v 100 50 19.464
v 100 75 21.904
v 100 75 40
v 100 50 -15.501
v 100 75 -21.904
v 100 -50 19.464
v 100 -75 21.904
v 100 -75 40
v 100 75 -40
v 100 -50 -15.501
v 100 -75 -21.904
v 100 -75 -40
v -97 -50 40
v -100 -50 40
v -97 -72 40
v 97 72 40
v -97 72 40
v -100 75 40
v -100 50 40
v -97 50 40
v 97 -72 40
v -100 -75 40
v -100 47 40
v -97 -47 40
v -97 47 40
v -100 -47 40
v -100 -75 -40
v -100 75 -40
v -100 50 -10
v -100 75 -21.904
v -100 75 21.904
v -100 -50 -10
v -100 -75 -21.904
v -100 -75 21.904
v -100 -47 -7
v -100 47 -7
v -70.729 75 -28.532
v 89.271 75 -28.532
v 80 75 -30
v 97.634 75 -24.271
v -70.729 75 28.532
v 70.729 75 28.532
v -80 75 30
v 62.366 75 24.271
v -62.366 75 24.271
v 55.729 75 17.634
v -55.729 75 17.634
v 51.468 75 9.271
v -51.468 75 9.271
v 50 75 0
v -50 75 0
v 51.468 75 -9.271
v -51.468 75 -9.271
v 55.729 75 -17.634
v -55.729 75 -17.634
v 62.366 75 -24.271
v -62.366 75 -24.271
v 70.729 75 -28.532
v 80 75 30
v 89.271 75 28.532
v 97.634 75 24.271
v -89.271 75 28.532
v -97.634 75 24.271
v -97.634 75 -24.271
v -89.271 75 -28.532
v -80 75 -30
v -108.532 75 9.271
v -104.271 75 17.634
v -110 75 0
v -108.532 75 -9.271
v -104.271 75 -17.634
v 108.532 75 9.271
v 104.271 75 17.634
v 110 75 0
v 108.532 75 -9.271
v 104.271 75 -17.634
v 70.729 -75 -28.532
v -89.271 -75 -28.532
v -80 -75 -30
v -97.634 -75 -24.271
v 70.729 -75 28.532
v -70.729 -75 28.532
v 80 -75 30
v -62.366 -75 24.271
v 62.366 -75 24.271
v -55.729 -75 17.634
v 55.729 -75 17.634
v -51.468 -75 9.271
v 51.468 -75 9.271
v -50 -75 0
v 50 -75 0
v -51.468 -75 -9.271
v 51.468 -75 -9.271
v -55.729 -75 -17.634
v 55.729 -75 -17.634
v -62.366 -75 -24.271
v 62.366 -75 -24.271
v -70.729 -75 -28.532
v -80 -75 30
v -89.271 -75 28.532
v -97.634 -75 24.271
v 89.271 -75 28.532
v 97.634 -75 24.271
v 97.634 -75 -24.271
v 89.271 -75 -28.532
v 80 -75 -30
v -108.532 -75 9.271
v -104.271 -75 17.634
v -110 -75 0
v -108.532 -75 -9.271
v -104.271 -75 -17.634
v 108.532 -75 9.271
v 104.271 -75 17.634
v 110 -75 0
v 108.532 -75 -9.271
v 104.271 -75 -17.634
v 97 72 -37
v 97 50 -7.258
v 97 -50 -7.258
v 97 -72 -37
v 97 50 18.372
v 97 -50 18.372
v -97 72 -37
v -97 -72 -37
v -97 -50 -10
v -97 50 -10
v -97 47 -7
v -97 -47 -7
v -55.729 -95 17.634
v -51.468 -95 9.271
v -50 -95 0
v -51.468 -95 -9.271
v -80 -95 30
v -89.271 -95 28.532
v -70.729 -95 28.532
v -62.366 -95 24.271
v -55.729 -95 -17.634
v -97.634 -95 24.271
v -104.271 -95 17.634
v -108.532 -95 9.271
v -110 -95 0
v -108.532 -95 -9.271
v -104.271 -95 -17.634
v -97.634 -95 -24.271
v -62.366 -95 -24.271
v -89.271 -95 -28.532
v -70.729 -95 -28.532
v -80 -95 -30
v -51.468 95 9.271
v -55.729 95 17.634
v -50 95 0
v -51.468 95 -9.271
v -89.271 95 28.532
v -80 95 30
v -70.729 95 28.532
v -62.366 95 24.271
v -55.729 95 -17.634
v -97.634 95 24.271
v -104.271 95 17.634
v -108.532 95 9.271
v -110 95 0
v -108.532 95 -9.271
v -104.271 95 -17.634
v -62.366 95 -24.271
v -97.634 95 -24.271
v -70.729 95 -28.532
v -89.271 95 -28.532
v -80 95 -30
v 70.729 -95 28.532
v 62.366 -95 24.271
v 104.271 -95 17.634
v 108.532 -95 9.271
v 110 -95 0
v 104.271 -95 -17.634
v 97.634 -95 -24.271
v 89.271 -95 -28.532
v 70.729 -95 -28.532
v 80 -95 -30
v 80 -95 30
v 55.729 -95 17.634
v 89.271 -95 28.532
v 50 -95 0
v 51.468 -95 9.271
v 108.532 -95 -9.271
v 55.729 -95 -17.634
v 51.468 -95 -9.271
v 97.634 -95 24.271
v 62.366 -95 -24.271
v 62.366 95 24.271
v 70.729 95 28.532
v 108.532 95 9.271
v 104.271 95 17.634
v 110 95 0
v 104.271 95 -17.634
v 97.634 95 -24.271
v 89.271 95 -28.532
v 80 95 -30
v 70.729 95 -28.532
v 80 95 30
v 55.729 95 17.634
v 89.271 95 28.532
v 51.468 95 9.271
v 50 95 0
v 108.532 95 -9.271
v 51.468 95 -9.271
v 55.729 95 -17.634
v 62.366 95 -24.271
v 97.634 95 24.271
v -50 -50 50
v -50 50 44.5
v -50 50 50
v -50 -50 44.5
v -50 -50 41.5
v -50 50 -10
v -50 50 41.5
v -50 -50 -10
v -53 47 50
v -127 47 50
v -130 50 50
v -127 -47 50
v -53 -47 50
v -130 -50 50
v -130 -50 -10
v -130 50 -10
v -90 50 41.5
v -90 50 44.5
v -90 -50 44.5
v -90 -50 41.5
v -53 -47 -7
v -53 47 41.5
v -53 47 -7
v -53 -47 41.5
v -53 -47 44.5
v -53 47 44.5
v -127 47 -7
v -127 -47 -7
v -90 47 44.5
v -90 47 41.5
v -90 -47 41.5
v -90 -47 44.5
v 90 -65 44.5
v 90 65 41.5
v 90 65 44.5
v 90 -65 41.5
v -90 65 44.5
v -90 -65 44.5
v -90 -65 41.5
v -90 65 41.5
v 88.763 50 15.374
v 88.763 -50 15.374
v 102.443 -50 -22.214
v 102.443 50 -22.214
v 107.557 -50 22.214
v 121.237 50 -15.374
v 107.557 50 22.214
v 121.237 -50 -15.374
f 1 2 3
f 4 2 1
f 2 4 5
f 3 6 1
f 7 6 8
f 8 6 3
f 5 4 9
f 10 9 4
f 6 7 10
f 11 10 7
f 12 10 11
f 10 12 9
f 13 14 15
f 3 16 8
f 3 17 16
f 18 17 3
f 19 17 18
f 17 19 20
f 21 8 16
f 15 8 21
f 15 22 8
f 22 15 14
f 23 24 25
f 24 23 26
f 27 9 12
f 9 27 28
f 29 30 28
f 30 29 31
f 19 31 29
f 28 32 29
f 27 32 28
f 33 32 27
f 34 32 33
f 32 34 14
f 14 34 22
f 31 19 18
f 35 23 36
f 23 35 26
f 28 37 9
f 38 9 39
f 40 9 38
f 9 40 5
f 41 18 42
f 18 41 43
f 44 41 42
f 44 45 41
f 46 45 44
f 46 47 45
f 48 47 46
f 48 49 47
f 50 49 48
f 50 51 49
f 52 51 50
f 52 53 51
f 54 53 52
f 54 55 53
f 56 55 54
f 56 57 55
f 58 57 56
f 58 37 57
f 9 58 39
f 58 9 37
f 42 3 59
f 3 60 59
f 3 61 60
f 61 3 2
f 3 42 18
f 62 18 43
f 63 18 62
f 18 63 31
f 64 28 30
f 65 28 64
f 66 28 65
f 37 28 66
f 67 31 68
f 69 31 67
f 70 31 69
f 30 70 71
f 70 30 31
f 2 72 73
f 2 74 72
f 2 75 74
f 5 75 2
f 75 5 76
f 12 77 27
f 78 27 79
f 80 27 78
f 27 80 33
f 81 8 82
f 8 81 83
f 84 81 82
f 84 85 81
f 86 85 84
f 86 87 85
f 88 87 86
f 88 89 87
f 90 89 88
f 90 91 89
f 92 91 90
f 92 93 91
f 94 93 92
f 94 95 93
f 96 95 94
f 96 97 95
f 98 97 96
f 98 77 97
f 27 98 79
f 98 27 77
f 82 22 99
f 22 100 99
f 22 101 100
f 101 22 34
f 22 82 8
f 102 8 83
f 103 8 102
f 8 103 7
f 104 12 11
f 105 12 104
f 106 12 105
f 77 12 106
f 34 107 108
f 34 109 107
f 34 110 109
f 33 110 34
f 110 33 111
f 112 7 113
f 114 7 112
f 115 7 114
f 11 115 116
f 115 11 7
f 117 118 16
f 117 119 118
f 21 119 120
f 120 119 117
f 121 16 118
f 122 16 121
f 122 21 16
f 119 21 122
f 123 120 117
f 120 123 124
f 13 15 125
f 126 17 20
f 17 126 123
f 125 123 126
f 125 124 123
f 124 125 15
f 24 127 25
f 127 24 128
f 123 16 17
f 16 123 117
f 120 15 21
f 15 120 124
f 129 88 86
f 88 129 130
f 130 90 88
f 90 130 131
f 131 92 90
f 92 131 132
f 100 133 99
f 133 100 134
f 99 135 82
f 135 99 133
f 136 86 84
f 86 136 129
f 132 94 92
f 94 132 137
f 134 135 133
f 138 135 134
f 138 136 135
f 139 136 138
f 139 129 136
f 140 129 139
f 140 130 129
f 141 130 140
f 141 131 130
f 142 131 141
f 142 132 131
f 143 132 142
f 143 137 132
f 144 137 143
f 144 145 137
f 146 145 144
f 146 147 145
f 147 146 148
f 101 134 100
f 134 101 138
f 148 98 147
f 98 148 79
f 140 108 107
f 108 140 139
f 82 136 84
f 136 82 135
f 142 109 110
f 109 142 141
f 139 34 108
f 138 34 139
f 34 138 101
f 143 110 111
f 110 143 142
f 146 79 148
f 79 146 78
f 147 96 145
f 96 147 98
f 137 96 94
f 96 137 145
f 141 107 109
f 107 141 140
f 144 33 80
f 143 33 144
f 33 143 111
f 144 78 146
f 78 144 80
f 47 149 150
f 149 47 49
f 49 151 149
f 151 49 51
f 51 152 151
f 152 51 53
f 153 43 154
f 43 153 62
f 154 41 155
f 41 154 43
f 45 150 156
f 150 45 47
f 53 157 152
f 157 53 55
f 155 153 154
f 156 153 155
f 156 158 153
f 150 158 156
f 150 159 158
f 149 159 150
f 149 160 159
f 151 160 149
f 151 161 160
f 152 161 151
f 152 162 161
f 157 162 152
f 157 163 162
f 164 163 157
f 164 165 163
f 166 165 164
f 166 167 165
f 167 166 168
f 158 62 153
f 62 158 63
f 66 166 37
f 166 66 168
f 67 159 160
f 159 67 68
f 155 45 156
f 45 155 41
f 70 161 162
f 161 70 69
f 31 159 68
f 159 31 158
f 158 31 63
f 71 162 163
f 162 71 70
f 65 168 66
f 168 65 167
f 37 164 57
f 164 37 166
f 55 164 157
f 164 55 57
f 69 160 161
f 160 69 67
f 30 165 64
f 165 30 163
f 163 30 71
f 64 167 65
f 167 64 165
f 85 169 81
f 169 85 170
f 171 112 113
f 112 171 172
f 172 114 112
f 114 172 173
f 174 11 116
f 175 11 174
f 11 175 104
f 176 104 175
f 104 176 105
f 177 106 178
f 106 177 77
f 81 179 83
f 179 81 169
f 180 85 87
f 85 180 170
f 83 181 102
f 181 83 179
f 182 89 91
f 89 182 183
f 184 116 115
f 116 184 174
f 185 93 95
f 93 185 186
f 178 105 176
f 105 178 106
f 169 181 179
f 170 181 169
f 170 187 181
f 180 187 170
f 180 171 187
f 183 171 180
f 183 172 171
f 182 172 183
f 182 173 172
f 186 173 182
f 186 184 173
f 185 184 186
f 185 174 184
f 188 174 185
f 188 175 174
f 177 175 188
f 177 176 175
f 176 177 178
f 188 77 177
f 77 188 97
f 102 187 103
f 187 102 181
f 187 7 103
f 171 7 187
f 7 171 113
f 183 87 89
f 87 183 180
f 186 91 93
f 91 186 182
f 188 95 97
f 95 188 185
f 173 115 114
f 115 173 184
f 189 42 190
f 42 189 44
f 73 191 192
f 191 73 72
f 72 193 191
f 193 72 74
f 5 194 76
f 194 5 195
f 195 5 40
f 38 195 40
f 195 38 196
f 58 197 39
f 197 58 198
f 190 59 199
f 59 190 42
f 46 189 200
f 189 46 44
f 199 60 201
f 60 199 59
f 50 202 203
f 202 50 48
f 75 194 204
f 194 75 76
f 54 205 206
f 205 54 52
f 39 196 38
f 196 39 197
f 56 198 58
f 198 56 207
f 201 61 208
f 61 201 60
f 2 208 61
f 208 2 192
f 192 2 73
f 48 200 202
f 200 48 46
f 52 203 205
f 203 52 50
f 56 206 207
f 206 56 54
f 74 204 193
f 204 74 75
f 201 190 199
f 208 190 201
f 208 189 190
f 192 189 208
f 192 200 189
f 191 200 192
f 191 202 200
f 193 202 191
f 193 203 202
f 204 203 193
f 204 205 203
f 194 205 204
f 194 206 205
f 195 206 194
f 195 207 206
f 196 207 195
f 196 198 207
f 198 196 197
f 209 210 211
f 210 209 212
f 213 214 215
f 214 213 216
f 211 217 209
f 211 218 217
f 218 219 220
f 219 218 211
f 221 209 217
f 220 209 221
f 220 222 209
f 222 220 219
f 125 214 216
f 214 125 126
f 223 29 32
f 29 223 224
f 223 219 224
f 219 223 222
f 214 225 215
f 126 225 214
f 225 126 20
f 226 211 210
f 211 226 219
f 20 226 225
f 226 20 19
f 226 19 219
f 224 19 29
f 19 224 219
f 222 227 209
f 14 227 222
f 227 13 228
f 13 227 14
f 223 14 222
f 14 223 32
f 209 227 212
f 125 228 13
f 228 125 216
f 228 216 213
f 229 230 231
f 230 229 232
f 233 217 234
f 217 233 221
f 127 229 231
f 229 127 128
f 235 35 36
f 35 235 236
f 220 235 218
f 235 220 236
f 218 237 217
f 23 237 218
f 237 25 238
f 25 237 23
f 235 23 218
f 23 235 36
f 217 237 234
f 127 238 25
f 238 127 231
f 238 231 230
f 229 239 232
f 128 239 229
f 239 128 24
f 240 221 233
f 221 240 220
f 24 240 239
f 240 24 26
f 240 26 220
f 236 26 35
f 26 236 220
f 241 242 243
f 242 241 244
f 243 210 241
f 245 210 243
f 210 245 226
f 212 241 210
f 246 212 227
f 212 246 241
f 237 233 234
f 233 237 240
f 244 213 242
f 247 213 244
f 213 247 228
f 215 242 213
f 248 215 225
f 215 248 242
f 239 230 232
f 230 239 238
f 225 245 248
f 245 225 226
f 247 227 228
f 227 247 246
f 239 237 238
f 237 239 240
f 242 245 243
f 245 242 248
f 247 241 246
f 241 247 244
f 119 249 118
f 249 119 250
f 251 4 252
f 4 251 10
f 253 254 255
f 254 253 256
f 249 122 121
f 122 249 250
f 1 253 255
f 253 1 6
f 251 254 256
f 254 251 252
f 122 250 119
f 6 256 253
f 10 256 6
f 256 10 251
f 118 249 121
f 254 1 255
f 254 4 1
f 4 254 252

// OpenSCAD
// Simplified Tennis Robot for quick STL generation
$fn = 20; // Lower resolution for faster rendering

// Main body
difference() {
    // Chassis
    cube([200, 150, 80], center=true);
    
    // Hollow interior
    translate([0, 0, 3])
    cube([194, 144, 80], center=true);
}

// Wheels
for(x = [-80, 80]) {
    for(y = [-85, 85]) {
        translate([x, y, 0])
        rotate([90, 0, 0])
        cylinder(h=20, r=30, center=true);
    }
}

// Solar panel on top
translate([0, 0, 43])
color([0.2, 0.2, 0.5])
cube([180, 130, 3], center=true);

// Ball scoop
translate([105, 0, 0])
rotate([0, -20, 0])
cube([20, 100, 40], center=true);

// Basket
translate([-90, 0, 20])
difference() {
    cube([80, 100, 60], center=true);
    translate([0, 0, 3])
    cube([74, 94, 60], center=true);
}
